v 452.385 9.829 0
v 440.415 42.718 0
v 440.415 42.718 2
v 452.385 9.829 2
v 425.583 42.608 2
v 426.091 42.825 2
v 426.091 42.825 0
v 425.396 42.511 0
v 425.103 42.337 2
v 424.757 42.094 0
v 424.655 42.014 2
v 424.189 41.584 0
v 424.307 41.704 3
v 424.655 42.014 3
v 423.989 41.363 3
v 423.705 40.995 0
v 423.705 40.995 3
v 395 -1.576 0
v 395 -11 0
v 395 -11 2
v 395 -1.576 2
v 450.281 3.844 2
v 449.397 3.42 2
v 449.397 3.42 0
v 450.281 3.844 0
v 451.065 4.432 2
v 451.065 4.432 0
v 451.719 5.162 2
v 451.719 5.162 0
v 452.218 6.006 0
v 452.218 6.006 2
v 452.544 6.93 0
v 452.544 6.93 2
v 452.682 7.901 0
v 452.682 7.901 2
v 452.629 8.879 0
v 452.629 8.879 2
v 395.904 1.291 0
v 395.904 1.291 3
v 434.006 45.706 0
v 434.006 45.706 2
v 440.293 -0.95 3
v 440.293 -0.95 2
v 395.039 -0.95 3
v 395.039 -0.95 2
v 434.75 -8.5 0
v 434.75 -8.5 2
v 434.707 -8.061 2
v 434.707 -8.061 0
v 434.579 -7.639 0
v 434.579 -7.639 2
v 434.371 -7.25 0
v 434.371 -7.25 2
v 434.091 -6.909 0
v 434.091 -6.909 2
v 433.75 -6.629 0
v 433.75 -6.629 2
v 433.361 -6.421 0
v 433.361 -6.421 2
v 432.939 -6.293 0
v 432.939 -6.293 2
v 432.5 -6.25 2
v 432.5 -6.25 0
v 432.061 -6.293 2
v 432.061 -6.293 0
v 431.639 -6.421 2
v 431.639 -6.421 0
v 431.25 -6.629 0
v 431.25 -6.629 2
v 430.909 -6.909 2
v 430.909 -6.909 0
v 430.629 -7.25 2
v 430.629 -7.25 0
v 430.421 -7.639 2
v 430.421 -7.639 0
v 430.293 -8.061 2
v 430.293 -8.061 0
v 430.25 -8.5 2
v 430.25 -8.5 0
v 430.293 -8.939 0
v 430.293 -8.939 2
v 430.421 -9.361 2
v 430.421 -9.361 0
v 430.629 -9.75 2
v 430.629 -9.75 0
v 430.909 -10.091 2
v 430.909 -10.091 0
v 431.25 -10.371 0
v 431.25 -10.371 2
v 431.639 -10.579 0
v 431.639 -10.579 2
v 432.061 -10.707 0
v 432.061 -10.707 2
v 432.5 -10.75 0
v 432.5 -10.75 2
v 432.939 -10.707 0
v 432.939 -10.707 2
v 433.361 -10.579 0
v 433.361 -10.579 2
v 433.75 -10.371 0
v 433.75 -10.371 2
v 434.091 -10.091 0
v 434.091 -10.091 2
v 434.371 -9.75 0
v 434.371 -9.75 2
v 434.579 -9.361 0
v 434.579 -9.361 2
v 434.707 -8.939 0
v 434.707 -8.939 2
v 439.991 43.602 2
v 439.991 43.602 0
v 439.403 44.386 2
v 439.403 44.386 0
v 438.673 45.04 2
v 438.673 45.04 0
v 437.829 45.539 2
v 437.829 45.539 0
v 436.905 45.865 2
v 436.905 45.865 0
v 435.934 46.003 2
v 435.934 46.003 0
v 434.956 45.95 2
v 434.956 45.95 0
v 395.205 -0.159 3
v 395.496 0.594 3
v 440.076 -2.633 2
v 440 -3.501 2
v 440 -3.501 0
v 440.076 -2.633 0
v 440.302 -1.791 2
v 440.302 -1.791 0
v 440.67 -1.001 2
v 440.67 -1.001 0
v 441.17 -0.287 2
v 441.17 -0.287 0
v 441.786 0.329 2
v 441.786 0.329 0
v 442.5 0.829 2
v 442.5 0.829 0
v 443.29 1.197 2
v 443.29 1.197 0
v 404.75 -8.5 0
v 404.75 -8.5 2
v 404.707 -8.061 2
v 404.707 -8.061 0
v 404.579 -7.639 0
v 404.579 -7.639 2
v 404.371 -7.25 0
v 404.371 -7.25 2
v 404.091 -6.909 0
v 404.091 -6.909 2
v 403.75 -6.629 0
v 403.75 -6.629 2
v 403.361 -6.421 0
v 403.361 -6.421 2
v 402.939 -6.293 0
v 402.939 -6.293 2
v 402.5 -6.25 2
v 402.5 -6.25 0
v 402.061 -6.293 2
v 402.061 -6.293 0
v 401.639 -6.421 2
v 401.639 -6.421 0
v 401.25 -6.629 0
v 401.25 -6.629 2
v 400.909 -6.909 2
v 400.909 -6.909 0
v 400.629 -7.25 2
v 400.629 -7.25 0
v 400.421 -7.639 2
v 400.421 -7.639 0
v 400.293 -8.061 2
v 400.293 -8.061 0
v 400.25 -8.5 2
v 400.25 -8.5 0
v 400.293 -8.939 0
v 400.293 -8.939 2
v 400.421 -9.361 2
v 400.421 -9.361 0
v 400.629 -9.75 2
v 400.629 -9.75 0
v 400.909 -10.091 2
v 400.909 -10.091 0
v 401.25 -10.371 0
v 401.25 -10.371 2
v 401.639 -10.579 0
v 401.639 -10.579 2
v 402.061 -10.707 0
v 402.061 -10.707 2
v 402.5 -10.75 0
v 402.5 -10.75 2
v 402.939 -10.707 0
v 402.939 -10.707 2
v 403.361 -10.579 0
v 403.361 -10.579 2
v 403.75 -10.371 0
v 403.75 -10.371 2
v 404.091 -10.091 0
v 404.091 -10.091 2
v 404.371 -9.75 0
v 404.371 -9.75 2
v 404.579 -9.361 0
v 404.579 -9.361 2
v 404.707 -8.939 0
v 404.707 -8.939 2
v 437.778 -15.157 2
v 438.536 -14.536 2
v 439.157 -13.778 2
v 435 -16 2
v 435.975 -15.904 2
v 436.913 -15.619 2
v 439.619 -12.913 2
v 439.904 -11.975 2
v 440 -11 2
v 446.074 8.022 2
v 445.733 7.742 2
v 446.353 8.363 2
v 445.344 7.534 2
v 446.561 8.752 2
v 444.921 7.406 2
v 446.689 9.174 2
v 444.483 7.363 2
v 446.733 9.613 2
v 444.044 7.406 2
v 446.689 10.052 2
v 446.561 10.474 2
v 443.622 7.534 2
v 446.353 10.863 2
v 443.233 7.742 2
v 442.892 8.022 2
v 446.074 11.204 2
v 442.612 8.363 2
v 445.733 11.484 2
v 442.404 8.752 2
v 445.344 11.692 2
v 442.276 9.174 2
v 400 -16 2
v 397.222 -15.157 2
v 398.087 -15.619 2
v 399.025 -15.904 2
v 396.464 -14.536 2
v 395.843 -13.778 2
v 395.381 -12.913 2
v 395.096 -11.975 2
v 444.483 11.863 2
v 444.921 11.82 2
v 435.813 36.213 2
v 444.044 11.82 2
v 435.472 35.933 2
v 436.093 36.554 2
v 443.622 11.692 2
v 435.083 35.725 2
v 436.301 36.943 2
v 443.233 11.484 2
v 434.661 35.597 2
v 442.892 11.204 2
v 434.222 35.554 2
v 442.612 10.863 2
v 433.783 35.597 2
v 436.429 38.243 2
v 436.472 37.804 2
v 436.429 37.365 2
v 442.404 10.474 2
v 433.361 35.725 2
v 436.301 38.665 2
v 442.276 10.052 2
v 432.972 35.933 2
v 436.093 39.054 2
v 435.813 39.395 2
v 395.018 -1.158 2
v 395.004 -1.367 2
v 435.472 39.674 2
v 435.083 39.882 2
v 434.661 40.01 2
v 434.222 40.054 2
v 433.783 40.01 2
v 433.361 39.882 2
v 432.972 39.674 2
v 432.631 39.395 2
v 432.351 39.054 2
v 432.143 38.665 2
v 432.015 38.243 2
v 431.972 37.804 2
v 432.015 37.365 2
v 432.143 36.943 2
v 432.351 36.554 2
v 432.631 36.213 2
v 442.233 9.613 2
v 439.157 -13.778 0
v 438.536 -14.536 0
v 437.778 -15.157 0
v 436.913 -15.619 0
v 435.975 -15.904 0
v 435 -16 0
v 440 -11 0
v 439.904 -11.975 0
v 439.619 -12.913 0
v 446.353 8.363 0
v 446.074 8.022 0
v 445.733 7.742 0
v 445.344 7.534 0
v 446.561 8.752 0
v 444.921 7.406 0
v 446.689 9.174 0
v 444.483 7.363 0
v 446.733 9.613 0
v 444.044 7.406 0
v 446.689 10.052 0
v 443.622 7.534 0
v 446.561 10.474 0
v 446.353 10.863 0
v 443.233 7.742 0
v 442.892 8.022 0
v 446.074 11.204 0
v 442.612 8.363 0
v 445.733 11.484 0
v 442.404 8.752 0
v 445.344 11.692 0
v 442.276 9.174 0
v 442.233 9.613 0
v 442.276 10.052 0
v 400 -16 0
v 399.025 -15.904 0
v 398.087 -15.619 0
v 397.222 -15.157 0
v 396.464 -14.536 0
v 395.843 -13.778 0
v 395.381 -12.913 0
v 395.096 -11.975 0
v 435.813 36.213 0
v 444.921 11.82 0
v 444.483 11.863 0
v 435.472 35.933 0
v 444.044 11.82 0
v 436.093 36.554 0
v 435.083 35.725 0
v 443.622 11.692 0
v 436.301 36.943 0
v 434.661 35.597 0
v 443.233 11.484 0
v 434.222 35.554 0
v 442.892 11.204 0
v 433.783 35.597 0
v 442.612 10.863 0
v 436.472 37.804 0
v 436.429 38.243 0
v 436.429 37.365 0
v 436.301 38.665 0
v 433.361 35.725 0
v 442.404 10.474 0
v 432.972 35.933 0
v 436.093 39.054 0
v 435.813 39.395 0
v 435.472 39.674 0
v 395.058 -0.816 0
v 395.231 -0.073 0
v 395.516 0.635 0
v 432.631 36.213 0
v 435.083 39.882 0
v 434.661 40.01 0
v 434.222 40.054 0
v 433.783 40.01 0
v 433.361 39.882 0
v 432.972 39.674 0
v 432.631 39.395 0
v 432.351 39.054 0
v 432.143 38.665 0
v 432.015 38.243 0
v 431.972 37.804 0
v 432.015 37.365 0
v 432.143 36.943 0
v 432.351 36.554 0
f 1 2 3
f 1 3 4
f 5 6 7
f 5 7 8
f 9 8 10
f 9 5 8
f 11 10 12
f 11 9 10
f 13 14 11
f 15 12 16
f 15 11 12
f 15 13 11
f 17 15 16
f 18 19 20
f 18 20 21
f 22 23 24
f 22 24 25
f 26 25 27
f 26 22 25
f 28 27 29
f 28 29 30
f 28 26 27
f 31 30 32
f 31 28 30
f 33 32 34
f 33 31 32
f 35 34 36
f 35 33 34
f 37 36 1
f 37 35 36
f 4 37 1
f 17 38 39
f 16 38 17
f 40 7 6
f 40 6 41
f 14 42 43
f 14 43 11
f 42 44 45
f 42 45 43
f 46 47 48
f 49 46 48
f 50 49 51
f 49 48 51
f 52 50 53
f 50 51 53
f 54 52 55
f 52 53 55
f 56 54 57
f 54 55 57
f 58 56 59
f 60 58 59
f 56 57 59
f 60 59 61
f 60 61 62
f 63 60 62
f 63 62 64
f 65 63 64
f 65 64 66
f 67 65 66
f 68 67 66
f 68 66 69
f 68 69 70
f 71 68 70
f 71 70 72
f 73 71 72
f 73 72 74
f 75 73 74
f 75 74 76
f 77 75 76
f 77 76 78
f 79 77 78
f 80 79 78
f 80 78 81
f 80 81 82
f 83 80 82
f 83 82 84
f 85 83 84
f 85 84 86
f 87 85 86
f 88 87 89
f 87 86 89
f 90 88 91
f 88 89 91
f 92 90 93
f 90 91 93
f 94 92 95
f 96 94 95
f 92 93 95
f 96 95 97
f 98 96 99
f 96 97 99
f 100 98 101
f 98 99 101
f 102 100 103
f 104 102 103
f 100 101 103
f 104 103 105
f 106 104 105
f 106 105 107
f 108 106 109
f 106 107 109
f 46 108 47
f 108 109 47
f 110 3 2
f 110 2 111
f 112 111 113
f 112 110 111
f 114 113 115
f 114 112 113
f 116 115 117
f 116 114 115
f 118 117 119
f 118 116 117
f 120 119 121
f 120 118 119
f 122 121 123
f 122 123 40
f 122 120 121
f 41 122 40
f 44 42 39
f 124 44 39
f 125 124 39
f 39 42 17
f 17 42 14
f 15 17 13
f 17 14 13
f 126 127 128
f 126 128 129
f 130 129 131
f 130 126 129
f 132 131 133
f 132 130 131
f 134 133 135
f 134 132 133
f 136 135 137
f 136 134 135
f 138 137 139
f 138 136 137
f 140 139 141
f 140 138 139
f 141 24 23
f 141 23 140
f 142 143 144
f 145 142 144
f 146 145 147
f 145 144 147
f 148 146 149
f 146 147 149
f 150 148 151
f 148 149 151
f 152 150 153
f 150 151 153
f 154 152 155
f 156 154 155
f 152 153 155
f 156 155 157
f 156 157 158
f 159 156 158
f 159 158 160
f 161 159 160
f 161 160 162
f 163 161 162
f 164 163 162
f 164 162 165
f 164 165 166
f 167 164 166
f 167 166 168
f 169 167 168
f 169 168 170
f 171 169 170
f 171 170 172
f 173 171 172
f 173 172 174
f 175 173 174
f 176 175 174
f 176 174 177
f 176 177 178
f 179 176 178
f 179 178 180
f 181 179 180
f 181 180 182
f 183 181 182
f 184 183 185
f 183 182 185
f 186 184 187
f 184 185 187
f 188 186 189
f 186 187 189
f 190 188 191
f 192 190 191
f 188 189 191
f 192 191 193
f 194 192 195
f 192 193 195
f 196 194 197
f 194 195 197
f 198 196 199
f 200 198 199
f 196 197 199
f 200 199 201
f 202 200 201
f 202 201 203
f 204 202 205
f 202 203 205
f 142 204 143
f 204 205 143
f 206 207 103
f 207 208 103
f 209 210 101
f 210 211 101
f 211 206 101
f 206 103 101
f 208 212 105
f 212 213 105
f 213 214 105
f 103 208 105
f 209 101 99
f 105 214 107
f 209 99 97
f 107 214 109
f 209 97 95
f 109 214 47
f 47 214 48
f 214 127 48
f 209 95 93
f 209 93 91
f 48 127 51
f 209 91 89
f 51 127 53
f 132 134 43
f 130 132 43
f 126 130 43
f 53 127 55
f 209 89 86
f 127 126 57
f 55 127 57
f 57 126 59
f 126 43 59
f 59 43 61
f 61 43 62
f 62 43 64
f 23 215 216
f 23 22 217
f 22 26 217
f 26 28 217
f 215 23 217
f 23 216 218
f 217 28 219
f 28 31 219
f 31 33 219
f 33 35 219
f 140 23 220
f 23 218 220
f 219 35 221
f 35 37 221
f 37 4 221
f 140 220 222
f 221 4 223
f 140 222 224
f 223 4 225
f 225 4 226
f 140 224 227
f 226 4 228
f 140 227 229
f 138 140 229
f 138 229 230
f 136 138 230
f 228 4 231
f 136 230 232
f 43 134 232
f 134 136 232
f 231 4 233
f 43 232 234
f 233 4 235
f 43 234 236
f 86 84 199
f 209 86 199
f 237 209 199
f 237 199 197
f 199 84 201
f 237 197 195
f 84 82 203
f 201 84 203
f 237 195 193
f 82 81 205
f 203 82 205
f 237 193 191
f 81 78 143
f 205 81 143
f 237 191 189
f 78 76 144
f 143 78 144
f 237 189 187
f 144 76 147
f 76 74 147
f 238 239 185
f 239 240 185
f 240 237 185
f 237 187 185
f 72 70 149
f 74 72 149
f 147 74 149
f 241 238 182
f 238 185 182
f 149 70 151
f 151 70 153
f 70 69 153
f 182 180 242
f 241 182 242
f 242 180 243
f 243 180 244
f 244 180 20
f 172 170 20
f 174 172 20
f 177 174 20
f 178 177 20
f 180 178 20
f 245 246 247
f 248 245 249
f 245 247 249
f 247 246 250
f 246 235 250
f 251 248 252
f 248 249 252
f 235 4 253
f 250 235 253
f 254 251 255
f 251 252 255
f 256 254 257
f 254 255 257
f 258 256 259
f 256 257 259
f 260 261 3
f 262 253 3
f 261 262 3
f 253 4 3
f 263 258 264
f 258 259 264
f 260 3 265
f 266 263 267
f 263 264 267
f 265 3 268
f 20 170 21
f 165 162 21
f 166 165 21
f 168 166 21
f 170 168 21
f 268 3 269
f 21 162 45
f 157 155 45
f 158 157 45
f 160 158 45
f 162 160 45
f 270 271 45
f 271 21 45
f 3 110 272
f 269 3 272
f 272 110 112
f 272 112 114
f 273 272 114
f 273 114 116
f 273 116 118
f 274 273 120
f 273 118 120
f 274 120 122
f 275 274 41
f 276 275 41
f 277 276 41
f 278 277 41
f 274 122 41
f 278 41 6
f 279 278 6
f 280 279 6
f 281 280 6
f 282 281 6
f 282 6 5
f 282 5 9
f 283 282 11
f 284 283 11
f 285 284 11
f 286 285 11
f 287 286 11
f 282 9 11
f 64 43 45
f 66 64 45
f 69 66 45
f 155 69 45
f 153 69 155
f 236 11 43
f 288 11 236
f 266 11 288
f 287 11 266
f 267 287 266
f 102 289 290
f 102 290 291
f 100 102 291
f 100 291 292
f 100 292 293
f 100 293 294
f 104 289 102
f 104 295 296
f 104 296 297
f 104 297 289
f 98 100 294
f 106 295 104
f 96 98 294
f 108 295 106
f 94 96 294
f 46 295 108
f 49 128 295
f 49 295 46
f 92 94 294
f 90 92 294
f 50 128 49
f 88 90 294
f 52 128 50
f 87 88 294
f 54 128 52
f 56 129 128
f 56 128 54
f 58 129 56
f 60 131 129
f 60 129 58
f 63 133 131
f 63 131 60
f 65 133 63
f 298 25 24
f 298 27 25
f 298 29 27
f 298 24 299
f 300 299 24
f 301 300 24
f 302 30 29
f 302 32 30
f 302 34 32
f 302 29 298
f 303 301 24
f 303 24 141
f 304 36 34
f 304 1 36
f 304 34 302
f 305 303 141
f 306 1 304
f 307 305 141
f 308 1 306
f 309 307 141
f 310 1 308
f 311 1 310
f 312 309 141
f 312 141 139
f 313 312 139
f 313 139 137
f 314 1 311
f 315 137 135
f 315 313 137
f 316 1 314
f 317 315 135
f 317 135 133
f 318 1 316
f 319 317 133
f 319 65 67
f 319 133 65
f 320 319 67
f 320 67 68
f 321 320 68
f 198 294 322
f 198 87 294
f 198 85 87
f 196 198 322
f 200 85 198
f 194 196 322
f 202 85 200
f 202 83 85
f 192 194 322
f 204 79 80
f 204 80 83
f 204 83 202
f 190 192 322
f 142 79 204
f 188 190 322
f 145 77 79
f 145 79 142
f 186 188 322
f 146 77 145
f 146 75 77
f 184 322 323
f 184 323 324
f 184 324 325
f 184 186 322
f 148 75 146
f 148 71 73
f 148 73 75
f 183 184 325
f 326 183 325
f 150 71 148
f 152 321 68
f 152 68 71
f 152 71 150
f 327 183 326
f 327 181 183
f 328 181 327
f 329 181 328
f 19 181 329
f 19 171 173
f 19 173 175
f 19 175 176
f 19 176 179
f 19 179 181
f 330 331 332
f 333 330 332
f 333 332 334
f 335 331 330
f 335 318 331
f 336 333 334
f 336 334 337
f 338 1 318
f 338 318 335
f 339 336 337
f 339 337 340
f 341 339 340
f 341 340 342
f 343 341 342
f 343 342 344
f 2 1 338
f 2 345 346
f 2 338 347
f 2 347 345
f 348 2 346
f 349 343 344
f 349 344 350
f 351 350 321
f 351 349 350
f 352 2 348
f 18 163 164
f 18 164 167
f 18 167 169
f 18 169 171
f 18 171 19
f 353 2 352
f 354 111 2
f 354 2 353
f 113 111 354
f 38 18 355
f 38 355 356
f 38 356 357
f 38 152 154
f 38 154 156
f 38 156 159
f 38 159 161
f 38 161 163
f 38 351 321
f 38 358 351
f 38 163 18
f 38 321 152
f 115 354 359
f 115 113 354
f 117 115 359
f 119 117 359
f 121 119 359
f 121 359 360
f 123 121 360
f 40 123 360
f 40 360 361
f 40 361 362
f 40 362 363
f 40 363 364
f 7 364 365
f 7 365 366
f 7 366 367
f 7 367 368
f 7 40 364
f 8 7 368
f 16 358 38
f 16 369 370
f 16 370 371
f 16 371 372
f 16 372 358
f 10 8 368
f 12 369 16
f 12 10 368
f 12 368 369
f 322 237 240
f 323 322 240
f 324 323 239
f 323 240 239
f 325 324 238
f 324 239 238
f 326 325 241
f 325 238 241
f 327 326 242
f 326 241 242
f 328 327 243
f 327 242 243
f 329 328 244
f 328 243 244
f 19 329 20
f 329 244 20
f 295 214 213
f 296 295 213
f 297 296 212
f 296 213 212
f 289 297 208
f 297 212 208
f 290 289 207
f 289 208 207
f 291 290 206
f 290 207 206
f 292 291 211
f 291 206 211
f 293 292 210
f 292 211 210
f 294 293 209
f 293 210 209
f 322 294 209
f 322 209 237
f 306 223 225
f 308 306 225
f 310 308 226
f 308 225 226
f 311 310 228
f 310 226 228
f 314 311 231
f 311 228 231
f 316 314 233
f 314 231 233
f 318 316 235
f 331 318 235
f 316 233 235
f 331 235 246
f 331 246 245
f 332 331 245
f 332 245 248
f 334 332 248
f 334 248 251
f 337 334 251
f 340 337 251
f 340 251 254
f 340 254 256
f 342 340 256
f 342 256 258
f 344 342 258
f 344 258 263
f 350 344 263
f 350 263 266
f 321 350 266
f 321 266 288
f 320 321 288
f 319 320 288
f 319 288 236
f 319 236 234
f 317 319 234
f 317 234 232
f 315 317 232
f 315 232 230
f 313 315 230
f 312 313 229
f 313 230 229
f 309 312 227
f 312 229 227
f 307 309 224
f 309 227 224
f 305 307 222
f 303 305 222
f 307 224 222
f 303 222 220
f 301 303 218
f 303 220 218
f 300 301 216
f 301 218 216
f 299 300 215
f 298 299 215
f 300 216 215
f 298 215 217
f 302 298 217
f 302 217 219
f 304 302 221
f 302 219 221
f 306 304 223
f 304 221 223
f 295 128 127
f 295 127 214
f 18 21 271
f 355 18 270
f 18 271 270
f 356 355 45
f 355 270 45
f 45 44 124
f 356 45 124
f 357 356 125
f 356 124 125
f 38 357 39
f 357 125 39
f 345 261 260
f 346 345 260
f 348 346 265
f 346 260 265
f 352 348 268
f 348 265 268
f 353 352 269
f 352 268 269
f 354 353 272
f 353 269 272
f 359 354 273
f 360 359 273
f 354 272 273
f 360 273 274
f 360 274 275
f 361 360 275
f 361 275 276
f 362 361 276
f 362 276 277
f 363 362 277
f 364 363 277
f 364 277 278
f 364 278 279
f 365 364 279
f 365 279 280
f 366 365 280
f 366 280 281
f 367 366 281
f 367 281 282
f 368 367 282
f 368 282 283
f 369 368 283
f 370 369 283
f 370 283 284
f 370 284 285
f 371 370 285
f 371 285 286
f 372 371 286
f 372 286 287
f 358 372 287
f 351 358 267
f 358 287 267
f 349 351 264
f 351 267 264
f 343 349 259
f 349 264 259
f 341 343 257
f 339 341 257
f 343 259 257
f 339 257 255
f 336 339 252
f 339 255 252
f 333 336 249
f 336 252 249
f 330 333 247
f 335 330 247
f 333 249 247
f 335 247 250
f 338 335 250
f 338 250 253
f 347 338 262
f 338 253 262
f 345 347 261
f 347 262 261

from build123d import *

# Parameters (mm, degrees)
EXTRUDE_1_DEPTH     = 3
SKETCH_2_R          = 2.25
CUT_EXTRUDE_1_DEPTH = 3
FILLET_1_R          = 5
CUT_EXTRUDE_2_DEPTH = 1


with BuildPart() as part:
    # ｽｹｯﾁ1 → ﾎﾞｽ - 押し出し1 (new body)
    with BuildSketch(Plane.XY):
        Polygon((440, 0), (440, -16), (395, -16), (395, 0), (424.60909355, 42.286167935), (438.704482862, 47.416470085), (454.095389312, 5.13030215), align=None)
    extrude(amount=EXTRUDE_1_DEPTH)

    # ｽｹｯﾁ2 → ｶｯﾄ - 押し出し1 (cut)
    with BuildSketch(Plane.XY.offset(3)):
        with Locations((402.5, -8.5)):
            Circle(SKETCH_2_R)
        with Locations((432.5, -8.5)):
            Circle(SKETCH_2_R)
        with Locations((434.221939281, 37.803624354)):
            Circle(SKETCH_2_R)
        with Locations((444.482543581, 9.612845731)):
            Circle(SKETCH_2_R)
    extrude(amount=-CUT_EXTRUDE_1_DEPTH, mode=Mode.SUBTRACT)

    # ﾌｨﾚｯﾄ1
    fillet_1_edges = [part.edges().sort_by_distance(p)[0] for p in [
        (395, -16, 1.5),
        (395, 0, 1.5),
        (424.60909355, 42.286167935, 1.5),
        (438.704482862, 47.416470085, 1.5),
        (454.095389312, 5.13030215, 1.5),
        (440, 0, 1.5),
        (440, -16, 1.5),
    ]]
    fillet(fillet_1_edges, radius=FILLET_1_R)

    # ｽｹｯﾁ4 → ｶｯﾄ - 押し出し2 (cut)
    with BuildSketch(Plane.XY.offset(3)):
        Polygon((438.704482862, 47.416470085), (455.121449742, 2.311224288), (443, -2.100622615), (443, -16), (395, -16), (395, -0.95), (440.292562834, -0.95), (424.562108919, 42.269066928), align=None)
    extrude(amount=-CUT_EXTRUDE_2_DEPTH, mode=Mode.SUBTRACT)


solid = part.part
